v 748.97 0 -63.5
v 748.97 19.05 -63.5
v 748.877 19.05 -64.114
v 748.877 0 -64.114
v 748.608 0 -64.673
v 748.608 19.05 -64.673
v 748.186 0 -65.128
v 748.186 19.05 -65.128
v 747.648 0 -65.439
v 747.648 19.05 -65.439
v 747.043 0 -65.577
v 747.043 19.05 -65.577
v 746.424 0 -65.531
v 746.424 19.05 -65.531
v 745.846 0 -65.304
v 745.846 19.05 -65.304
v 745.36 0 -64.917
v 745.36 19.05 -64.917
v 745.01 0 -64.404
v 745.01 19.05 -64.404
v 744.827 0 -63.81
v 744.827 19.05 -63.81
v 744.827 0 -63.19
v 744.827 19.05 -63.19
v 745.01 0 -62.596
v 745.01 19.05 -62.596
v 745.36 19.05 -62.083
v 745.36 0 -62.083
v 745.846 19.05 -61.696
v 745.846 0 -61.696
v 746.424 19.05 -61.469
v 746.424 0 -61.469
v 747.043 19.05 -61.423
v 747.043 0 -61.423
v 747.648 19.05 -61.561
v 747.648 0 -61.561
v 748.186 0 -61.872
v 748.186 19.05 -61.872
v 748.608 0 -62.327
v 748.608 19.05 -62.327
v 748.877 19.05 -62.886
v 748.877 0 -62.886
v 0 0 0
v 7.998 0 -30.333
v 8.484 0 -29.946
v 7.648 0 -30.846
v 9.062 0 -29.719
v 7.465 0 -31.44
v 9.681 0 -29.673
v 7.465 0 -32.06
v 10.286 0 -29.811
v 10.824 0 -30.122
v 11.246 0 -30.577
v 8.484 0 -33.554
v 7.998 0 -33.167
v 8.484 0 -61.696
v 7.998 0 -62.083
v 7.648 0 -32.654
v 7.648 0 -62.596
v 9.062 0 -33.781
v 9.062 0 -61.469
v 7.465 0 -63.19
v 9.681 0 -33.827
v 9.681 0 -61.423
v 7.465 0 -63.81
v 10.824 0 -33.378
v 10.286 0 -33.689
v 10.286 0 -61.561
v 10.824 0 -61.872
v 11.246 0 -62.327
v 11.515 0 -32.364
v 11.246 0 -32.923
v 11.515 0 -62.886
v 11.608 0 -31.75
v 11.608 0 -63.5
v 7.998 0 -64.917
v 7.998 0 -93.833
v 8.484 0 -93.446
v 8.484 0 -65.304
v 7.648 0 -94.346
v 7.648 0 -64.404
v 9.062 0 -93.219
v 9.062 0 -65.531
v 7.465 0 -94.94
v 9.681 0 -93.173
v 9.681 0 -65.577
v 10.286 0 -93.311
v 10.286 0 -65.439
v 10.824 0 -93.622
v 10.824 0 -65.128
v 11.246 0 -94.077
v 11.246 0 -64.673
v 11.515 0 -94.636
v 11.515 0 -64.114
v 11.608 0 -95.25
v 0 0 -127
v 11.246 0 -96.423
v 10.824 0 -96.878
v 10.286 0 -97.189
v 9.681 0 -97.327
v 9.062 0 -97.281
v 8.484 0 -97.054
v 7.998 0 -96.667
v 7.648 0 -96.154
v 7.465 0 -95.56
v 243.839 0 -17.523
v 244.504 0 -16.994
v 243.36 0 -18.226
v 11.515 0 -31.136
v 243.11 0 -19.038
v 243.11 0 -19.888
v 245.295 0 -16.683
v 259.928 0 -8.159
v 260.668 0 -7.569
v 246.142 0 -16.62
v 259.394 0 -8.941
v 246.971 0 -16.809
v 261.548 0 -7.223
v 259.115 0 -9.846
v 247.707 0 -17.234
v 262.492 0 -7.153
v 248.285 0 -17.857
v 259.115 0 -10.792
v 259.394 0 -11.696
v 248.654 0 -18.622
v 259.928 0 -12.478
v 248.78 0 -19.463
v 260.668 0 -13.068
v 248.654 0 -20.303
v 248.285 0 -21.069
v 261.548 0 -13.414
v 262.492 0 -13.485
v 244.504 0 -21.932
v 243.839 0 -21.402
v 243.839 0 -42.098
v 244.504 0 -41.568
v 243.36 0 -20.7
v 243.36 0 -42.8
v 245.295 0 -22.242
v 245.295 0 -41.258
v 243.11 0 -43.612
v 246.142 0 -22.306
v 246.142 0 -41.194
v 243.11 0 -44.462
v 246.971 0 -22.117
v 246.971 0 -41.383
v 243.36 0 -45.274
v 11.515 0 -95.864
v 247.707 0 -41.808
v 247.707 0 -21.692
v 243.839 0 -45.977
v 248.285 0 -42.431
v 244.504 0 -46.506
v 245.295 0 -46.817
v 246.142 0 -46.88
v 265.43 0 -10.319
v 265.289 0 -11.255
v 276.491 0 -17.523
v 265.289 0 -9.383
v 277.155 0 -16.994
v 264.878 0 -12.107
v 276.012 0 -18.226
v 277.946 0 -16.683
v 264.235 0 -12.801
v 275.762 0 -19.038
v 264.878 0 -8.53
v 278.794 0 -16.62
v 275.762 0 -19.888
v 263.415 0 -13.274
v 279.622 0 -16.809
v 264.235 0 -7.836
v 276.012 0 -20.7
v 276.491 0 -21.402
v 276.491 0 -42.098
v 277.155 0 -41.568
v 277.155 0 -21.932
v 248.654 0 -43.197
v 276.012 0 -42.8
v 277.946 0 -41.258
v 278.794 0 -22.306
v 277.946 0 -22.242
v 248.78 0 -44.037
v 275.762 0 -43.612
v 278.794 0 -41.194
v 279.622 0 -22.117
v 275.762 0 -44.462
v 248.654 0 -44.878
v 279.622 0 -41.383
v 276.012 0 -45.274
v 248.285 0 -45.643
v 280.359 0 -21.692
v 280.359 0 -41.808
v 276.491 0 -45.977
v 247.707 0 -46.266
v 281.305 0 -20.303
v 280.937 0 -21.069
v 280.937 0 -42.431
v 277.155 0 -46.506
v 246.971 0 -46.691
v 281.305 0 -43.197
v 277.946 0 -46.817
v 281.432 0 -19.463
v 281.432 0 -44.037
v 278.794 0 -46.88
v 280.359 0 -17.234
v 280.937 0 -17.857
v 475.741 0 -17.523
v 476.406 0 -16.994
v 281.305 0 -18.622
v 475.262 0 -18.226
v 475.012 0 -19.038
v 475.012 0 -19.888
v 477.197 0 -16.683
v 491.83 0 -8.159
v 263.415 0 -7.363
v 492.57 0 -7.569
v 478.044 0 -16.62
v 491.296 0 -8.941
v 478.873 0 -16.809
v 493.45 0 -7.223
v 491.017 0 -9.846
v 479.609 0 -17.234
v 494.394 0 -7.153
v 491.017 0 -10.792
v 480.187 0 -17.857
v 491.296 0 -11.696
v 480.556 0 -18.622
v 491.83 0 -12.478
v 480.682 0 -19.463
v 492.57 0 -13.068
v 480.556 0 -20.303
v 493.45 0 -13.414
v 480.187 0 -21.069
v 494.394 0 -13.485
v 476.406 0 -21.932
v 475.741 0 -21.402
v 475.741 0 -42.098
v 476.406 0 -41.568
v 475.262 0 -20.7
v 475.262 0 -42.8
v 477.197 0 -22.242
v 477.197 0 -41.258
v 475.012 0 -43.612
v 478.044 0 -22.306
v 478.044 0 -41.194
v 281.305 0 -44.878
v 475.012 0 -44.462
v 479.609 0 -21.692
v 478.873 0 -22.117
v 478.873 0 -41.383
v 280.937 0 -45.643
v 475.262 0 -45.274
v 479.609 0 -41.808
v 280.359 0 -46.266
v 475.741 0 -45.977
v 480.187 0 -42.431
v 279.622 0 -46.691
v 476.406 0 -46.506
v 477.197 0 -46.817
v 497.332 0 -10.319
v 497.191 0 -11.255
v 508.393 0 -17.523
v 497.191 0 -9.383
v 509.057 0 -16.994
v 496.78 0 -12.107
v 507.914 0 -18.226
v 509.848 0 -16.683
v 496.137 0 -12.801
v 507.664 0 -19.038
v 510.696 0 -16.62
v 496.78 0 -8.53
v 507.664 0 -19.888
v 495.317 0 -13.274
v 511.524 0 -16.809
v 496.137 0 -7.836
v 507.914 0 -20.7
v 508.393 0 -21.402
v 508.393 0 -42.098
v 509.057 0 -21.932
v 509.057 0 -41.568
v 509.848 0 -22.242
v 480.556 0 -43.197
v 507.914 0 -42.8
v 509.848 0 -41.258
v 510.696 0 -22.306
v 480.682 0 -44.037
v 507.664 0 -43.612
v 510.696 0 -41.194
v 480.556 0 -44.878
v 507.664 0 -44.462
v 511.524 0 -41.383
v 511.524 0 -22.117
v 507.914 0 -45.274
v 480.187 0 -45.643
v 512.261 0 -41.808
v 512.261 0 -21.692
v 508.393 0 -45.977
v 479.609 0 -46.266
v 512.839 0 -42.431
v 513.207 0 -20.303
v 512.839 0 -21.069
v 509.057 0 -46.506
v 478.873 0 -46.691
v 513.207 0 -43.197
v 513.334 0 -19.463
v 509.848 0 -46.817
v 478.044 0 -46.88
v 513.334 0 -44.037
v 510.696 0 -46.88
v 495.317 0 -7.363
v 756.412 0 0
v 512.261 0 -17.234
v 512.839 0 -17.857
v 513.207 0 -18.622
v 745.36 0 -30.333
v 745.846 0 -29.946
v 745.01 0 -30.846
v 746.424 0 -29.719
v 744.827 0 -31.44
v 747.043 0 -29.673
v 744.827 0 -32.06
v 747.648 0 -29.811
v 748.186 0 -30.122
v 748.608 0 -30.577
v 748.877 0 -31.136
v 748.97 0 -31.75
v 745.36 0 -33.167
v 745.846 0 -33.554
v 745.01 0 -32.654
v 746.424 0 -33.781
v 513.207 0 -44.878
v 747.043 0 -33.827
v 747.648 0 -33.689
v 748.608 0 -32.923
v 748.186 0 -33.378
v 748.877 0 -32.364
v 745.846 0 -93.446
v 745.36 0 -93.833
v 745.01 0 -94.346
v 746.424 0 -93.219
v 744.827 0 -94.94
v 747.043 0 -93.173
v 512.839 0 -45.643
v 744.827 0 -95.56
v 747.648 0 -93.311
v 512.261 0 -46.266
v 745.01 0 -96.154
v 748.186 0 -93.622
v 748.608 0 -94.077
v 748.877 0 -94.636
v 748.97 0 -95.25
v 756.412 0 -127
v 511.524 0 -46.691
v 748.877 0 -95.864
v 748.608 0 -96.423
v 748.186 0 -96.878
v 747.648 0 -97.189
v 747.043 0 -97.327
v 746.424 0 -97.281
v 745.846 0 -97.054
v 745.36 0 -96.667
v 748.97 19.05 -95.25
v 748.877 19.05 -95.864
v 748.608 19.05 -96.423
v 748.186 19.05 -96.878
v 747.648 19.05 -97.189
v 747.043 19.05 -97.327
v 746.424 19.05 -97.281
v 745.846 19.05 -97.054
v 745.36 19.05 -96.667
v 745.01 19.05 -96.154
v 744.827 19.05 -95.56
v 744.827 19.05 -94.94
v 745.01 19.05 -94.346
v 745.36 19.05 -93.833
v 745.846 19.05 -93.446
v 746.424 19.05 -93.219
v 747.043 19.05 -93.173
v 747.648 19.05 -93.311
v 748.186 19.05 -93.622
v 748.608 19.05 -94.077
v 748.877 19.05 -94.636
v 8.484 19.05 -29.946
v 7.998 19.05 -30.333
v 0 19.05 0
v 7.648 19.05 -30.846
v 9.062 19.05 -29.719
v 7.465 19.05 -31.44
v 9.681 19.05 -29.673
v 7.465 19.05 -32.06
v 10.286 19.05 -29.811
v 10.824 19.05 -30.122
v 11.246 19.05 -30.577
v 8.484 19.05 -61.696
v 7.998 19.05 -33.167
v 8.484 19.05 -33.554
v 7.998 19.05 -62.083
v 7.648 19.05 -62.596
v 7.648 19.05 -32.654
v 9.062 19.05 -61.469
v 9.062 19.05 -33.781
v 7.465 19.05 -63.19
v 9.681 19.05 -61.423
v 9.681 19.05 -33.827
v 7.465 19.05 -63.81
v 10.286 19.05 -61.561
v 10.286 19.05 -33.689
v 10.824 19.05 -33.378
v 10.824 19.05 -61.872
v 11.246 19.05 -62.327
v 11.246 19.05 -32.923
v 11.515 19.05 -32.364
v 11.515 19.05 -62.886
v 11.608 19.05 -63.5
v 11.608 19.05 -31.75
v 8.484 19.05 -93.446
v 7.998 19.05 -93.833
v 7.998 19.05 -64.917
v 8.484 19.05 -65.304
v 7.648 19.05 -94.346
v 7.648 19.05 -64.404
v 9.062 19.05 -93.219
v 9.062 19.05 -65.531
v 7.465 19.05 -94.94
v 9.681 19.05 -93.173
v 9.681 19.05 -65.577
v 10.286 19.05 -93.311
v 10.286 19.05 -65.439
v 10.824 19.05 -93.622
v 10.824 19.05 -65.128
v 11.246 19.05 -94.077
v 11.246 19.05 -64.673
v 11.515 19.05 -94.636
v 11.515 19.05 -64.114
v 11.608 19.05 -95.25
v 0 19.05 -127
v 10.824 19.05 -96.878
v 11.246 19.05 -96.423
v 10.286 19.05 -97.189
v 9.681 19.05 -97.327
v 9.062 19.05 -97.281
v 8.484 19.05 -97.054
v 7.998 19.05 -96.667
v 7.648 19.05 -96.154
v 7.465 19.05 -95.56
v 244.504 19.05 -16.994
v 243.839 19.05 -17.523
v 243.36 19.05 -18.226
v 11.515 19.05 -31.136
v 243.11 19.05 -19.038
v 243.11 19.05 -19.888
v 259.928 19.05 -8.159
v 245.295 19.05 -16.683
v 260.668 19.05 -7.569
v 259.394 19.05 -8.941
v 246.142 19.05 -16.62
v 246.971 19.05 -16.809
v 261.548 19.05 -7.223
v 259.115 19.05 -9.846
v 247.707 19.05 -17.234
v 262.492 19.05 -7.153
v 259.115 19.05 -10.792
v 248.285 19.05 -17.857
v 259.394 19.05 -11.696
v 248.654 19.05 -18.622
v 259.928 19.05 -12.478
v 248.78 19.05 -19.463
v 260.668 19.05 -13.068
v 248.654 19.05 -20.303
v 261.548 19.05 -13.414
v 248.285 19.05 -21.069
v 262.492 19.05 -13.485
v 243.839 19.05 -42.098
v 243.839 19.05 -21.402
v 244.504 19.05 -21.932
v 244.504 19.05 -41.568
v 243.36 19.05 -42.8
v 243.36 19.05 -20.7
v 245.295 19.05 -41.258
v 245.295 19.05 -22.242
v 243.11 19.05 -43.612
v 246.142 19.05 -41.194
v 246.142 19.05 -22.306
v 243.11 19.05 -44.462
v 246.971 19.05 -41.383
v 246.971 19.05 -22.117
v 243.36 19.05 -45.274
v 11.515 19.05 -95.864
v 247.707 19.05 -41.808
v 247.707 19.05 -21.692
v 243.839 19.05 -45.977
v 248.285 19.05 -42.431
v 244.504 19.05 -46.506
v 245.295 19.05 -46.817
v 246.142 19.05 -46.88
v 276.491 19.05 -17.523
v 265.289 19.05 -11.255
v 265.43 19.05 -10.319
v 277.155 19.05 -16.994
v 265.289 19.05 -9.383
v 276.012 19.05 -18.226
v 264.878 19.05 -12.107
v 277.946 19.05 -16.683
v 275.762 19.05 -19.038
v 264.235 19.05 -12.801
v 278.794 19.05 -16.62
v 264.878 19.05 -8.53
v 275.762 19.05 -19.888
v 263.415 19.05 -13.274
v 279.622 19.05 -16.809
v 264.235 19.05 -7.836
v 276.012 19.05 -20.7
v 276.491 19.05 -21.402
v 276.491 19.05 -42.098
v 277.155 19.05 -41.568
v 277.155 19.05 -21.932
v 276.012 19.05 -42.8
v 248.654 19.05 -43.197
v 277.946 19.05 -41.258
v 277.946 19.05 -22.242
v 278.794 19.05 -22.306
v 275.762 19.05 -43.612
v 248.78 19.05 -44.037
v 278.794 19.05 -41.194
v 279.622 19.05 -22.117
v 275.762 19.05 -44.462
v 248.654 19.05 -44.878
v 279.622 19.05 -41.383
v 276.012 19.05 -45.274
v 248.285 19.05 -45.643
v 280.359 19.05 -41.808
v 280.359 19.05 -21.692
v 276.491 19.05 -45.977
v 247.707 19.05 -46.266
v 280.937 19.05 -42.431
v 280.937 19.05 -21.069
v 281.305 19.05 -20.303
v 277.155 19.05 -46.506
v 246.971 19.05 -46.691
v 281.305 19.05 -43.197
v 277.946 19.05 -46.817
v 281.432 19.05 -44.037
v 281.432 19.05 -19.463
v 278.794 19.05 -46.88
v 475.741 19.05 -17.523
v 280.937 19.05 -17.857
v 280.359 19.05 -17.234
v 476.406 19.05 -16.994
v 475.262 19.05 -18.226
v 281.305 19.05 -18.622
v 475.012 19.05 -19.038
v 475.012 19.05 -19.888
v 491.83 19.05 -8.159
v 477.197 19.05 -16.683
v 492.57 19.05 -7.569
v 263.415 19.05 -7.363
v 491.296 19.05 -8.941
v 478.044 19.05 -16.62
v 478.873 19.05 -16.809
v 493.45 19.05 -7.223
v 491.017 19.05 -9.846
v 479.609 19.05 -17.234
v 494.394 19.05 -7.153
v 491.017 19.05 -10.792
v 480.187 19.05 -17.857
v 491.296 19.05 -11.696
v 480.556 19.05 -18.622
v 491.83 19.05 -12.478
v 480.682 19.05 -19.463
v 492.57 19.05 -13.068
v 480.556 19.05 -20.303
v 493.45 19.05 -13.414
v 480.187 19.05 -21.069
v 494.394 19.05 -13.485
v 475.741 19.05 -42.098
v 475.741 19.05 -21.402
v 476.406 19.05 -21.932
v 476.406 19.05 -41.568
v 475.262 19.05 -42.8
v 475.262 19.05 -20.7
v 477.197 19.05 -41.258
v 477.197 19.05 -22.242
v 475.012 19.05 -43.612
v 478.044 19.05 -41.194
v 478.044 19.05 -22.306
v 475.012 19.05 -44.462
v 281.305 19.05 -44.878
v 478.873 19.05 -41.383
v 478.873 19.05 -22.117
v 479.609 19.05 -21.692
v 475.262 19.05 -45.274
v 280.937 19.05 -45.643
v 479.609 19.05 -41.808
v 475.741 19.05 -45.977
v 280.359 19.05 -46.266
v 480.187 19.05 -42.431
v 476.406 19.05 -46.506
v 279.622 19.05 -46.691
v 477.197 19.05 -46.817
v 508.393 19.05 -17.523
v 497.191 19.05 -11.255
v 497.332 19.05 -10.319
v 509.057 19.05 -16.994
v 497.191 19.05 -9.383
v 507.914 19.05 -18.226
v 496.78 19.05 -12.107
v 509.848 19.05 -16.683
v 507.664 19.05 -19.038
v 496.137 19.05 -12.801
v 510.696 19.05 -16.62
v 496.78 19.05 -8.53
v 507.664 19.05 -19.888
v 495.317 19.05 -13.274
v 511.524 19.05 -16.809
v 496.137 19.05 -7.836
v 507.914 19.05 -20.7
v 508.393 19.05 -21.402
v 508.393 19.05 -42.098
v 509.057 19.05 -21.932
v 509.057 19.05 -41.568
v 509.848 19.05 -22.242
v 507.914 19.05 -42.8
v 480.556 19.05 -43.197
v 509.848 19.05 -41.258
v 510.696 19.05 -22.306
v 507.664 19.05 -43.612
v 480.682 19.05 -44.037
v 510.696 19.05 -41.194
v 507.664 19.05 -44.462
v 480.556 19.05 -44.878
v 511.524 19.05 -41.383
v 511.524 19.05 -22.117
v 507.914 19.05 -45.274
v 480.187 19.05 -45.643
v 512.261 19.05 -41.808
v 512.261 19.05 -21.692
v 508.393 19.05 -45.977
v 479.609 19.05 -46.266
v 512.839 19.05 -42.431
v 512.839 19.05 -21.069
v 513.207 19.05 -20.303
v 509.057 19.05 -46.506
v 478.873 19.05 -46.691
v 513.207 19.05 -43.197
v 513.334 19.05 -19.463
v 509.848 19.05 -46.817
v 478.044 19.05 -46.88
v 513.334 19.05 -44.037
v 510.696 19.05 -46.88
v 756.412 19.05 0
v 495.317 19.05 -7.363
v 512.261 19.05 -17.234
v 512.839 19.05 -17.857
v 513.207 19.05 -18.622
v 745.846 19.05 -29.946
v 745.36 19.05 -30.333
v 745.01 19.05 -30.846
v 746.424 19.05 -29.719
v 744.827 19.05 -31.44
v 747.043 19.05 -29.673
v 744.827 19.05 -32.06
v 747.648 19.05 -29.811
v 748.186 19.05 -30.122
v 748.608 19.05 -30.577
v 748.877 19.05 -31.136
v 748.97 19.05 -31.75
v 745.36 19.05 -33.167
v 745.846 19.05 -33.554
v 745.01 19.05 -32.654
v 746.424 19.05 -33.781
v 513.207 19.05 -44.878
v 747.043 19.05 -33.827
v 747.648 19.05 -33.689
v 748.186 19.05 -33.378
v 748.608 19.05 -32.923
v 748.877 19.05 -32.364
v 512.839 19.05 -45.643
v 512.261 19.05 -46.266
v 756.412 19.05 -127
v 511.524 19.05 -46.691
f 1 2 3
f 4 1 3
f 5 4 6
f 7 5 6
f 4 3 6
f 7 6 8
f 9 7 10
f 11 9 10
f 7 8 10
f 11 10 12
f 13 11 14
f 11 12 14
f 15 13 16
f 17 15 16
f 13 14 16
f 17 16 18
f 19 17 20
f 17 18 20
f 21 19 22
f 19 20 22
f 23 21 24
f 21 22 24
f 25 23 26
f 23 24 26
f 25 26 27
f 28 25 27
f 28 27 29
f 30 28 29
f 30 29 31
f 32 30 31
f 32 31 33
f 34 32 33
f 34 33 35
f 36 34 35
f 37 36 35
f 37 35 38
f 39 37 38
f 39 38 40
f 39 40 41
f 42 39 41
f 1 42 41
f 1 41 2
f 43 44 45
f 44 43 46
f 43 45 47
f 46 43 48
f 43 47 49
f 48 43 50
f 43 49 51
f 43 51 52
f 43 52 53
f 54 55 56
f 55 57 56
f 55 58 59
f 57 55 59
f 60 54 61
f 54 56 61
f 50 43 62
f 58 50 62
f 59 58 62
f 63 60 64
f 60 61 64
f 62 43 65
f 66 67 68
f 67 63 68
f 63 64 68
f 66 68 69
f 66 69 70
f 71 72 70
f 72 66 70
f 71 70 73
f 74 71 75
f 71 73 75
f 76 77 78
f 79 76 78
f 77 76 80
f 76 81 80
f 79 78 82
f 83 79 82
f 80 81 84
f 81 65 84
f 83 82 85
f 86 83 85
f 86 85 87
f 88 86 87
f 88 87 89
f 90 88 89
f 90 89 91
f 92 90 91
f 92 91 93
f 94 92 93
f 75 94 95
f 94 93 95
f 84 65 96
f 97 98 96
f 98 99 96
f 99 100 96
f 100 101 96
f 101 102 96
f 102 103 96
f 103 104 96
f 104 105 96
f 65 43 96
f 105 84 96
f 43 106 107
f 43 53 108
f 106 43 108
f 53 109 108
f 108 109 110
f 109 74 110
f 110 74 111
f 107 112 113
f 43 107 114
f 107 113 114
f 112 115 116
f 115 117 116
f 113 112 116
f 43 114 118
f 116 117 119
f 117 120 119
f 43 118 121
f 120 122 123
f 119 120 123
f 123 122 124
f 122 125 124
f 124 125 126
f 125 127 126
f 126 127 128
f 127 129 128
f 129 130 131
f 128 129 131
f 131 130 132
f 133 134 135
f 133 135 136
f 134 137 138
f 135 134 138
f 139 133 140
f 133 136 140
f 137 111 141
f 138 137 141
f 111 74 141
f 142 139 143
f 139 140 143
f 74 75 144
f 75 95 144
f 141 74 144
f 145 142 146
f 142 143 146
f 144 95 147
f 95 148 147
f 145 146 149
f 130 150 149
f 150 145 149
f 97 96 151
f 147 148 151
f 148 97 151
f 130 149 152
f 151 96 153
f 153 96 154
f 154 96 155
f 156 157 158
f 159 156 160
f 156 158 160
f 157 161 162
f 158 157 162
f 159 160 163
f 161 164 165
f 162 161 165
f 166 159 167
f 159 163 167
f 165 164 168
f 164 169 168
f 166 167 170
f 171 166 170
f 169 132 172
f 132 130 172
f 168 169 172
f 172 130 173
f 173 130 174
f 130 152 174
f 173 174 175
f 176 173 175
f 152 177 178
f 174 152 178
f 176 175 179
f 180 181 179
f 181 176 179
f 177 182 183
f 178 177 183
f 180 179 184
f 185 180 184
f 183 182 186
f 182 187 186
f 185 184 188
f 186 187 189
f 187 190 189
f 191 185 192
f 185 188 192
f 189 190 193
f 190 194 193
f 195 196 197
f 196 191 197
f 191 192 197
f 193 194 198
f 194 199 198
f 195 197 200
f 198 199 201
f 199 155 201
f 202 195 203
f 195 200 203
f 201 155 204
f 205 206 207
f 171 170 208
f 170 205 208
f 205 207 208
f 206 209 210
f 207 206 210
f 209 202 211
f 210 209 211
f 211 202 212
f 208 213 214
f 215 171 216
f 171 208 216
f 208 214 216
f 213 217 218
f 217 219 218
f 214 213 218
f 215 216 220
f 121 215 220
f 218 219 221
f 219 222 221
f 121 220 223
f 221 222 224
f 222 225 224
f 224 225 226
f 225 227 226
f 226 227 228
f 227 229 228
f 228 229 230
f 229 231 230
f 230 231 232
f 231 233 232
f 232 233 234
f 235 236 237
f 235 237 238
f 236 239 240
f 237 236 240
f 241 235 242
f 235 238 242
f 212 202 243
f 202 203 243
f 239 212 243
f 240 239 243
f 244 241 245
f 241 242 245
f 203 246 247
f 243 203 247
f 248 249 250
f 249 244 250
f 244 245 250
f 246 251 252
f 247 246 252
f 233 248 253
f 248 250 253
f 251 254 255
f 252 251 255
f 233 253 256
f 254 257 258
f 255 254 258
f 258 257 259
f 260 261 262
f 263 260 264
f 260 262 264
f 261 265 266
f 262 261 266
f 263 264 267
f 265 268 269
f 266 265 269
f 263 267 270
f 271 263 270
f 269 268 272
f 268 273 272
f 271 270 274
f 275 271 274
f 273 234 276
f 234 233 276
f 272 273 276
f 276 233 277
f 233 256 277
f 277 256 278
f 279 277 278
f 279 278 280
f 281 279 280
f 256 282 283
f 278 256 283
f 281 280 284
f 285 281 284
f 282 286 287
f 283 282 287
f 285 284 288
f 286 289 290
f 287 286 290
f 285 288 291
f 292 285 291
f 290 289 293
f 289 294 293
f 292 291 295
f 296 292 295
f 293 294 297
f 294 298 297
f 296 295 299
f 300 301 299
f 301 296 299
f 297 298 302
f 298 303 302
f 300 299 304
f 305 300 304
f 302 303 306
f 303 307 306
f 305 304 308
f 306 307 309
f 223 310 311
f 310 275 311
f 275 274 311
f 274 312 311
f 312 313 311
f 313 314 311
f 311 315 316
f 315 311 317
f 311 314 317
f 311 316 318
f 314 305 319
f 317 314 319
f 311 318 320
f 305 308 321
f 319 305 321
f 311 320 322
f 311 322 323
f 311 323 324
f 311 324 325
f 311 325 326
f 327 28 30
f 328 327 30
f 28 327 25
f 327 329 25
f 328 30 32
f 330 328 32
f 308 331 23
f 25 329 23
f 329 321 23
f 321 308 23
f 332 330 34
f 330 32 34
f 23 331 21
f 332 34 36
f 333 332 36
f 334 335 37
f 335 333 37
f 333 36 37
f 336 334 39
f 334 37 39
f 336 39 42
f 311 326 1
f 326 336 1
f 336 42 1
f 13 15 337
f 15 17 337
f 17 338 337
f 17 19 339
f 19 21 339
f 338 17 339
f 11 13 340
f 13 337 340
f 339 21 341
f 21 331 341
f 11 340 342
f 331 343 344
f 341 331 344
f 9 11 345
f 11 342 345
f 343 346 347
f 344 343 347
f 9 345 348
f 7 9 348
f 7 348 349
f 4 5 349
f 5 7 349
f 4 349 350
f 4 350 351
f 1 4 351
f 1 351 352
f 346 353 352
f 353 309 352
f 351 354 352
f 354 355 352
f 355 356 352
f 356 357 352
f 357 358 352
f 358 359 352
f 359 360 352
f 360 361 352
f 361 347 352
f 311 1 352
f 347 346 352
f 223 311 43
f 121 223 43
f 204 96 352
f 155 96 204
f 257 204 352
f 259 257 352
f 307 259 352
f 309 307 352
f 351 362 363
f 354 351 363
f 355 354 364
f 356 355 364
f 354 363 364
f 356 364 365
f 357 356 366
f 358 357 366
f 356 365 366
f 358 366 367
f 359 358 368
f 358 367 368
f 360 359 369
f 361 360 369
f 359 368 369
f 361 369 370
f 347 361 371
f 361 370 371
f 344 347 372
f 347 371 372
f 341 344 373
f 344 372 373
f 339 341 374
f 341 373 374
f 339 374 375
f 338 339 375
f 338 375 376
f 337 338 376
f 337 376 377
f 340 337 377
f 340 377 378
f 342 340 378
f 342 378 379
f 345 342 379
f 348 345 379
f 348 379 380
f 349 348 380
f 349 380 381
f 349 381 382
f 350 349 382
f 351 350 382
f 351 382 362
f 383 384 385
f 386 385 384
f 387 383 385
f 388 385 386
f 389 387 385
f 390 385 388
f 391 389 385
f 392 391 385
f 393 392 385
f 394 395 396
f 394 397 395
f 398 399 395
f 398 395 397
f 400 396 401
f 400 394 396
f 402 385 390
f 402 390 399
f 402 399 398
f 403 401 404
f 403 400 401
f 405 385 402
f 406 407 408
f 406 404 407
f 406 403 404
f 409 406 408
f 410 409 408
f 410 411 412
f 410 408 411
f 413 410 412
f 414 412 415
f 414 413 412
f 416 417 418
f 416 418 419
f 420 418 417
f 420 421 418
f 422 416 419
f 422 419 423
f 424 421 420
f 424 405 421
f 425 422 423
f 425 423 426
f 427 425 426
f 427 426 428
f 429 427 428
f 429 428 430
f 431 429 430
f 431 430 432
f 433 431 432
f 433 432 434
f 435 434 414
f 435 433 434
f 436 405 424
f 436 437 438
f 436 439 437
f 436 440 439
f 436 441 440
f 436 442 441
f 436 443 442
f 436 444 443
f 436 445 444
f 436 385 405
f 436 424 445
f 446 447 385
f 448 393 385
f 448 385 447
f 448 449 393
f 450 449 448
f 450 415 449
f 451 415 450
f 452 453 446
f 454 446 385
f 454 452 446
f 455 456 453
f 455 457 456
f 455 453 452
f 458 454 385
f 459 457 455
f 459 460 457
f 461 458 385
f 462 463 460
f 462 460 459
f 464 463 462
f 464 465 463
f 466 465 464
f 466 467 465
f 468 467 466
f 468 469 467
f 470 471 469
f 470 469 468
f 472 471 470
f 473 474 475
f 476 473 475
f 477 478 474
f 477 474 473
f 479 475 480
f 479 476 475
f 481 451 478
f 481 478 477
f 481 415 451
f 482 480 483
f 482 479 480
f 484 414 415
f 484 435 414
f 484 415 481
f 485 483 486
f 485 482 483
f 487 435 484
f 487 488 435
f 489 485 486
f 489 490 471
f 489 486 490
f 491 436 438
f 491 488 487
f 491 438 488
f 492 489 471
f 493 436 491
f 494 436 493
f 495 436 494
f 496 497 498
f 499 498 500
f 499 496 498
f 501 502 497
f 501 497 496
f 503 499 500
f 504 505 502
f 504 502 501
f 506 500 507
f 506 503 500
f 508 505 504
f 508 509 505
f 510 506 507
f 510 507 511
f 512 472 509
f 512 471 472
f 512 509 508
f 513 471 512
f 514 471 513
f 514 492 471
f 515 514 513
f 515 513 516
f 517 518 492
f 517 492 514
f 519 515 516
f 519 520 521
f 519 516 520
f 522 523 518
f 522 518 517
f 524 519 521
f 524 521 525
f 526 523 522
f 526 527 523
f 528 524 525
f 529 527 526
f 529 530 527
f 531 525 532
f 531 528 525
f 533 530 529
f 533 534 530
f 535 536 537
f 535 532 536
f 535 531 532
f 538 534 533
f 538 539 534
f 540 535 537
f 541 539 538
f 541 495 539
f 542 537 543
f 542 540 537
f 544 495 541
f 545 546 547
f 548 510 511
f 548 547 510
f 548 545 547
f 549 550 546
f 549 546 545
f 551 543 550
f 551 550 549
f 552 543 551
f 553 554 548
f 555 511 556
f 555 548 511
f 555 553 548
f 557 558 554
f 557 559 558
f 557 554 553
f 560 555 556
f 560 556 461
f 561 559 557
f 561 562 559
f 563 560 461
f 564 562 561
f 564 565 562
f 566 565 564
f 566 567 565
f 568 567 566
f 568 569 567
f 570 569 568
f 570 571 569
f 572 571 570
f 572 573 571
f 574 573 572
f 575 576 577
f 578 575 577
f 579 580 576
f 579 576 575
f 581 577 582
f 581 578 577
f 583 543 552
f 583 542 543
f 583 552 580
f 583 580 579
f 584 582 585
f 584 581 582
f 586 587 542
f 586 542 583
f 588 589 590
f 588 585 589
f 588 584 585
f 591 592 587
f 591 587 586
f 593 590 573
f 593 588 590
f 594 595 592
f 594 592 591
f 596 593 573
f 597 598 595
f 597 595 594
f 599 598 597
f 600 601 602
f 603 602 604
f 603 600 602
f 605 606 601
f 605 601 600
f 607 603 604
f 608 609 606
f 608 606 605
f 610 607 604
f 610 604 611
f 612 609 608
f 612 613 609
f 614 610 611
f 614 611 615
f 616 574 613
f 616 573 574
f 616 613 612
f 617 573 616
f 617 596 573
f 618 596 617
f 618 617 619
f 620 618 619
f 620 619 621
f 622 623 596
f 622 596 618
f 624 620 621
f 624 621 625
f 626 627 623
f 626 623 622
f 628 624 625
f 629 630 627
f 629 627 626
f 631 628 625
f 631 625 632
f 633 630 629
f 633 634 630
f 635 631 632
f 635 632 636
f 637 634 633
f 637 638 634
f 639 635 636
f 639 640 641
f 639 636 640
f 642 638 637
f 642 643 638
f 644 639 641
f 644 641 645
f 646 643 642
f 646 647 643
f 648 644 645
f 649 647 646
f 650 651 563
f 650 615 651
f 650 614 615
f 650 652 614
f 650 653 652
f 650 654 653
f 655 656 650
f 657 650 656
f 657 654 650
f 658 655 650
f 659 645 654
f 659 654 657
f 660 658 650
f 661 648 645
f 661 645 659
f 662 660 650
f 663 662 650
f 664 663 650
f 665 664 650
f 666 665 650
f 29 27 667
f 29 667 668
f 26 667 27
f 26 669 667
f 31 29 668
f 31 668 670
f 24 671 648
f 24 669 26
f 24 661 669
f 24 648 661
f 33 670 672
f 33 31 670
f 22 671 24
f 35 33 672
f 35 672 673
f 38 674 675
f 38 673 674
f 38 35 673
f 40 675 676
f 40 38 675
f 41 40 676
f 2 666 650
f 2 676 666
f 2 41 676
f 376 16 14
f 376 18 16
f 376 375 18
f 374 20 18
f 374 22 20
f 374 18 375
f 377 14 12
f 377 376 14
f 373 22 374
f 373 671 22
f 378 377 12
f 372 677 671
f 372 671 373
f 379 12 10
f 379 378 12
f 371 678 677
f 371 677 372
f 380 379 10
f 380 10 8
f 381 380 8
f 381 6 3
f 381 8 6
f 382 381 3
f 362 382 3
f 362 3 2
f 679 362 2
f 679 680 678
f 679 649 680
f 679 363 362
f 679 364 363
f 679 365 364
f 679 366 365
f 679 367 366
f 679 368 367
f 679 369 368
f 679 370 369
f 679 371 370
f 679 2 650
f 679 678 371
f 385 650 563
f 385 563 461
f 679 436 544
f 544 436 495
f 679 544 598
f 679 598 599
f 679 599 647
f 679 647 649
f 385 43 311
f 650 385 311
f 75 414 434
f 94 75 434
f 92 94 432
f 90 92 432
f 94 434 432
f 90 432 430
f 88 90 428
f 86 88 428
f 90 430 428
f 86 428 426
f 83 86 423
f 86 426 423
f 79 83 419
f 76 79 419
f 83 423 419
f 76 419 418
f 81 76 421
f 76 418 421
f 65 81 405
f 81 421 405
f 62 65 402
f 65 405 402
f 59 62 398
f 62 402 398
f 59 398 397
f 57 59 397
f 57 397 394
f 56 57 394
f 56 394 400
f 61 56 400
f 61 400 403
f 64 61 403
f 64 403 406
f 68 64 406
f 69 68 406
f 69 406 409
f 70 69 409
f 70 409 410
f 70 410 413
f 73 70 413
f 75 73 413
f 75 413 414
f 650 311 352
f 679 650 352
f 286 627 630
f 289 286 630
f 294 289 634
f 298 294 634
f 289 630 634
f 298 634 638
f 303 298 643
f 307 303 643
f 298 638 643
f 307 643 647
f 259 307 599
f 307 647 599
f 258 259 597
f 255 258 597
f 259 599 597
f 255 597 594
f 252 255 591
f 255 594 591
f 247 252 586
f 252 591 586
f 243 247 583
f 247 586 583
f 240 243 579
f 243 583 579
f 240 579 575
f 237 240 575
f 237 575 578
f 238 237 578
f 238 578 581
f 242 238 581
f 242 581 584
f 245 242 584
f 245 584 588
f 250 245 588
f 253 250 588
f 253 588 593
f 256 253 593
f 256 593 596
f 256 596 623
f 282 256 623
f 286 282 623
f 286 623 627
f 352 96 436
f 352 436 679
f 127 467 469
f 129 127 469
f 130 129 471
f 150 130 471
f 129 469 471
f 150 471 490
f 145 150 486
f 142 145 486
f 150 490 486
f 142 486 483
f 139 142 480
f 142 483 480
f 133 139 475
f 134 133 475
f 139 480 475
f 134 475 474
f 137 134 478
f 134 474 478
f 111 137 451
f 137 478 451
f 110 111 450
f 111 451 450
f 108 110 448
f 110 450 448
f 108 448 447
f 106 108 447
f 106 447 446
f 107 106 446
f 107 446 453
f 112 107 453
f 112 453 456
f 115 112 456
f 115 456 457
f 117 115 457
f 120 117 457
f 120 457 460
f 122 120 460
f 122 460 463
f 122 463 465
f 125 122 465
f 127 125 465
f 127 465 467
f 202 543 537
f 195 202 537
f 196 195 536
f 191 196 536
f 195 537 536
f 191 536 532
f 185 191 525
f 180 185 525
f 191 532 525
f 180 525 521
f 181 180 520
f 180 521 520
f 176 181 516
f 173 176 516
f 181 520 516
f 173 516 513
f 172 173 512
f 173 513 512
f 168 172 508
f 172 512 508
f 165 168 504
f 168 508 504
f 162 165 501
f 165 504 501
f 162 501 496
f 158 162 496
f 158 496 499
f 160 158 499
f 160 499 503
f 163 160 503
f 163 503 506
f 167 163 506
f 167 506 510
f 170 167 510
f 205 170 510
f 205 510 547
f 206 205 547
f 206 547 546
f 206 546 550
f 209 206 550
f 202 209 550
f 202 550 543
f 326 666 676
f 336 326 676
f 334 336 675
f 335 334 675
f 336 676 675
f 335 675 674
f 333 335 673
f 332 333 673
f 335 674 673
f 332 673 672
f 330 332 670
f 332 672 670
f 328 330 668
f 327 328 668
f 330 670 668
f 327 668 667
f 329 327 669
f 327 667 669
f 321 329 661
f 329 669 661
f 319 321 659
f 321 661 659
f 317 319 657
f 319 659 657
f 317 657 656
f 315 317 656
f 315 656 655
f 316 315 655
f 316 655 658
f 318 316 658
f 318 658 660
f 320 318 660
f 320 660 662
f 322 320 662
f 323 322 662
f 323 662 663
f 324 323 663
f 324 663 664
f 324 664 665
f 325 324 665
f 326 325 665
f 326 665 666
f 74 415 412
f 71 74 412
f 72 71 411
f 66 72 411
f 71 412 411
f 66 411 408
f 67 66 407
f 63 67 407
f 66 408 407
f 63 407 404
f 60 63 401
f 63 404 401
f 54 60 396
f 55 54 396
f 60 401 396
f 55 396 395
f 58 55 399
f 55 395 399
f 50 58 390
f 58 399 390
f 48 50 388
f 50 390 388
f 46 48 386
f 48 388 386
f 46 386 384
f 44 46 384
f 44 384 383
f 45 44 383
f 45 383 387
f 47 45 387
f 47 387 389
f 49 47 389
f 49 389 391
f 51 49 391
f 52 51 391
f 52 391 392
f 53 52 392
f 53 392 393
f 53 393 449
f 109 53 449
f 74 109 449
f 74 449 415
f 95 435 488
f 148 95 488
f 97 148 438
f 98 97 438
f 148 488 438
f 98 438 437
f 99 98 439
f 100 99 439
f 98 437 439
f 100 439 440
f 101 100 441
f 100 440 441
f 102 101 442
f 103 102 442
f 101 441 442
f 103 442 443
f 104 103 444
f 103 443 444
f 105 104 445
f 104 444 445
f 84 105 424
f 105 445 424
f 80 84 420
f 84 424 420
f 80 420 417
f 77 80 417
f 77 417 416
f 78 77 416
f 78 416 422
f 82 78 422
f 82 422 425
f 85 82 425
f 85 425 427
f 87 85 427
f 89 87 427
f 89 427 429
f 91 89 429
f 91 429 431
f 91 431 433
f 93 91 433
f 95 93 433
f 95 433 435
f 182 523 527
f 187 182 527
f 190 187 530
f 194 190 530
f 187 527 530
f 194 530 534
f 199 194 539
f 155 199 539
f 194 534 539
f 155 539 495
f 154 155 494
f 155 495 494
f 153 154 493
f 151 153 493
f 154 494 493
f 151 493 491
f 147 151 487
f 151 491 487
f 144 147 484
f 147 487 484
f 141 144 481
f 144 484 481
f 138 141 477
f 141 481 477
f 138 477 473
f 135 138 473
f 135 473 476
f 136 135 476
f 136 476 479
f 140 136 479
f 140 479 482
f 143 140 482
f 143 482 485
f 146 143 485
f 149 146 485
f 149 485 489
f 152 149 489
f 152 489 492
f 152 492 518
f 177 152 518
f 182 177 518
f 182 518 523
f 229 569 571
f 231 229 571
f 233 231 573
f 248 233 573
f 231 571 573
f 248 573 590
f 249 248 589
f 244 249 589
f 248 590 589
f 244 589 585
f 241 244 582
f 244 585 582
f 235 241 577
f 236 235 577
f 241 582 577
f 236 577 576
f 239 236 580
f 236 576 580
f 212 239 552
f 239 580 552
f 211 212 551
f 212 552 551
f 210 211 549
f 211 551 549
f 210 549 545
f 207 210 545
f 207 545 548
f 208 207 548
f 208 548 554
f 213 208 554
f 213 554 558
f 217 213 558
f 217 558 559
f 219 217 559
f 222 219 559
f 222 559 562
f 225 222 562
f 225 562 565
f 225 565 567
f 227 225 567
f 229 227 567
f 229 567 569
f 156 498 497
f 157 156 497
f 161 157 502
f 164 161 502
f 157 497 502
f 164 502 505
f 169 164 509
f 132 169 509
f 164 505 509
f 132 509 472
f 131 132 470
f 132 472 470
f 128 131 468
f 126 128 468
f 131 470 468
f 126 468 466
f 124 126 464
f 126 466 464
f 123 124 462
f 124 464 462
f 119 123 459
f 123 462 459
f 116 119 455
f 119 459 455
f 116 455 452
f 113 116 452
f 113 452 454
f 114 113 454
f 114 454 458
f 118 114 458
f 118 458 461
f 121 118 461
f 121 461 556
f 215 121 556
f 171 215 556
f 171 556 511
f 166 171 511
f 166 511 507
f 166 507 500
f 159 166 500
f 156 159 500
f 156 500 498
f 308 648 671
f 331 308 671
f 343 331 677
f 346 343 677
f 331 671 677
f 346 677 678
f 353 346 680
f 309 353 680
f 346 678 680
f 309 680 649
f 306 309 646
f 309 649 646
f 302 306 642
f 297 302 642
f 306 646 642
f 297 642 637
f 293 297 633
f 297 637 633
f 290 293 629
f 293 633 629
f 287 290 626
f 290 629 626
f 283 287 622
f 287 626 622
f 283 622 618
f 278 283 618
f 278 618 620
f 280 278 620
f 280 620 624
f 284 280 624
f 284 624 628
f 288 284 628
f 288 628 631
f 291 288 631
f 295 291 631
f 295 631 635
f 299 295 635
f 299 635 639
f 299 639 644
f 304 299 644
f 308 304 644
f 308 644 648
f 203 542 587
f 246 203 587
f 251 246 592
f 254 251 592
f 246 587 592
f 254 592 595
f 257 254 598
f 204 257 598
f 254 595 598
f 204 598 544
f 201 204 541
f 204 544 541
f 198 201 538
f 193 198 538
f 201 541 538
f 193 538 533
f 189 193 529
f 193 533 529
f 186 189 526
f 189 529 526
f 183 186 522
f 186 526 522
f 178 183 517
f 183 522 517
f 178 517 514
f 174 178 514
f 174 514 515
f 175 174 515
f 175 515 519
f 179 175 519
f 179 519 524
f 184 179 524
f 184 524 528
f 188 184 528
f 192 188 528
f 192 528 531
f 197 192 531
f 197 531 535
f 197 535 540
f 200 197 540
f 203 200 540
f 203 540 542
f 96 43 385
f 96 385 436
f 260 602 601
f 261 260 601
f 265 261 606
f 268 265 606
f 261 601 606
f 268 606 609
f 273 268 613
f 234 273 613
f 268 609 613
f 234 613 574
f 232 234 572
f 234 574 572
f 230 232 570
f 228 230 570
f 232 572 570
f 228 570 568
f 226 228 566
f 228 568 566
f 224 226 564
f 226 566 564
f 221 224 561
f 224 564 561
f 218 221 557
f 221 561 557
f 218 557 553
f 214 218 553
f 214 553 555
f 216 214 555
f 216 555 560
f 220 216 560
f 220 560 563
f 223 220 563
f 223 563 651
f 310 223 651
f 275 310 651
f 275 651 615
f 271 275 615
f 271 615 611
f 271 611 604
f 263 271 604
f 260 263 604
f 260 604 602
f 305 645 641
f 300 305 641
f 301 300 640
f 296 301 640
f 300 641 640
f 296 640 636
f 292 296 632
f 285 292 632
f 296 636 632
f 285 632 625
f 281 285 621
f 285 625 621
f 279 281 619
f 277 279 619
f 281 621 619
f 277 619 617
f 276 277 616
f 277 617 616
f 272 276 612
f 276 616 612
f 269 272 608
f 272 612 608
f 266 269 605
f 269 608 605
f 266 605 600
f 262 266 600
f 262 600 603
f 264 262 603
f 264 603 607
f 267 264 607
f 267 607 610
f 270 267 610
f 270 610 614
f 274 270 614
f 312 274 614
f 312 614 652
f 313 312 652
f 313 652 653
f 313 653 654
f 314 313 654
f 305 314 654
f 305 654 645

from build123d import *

# Parameters (mm, degrees)
SKETCH2_W           = 756.412
SKETCH2_H           = 127
BOSS_EXTRUDE1_DEPTH = 19.05
CUT_EXTRUDE1_REACH  = 21.05
SKETCH3_R           = 2.85115
CUT_EXTRUDE2_REACH  = 21.05
SKETCH4_R           = 3.175
CUT_EXTRUDE3_REACH  = 21.05
SKETCH5_R           = 2.0828


with BuildPart() as part:
    # Sketch2 → Boss-Extrude1 (new body)
    with BuildSketch(Plane(origin=(0, 0, 0), x_dir=(1, 0, 0), z_dir=(0, 1, 0))):
        with Locations((378.206, 63.5)):
            Rectangle(SKETCH2_W, SKETCH2_H)
    extrude(amount=BOSS_EXTRUDE1_DEPTH)

    # Sketch3 → Cut-Extrude1 (cut, up to next)
    with BuildSketch(Plane(origin=(0, 19.05, 0), x_dir=(1, 0, 0), z_dir=(0, 1, 0)), mode=Mode.PRIVATE) as cut_extrude1_sk1:
        with Locations((245.92915, 19.46275)):
            Circle(SKETCH3_R)
    cut_extrude1_tool1 = extrude(cut_extrude1_sk1.sketch, amount=-CUT_EXTRUDE1_REACH, mode=Mode.PRIVATE) & part.part
    add(cut_extrude1_tool1.solids().sort_by_distance((245.92915, 19.05, -19.46275))[0], mode=Mode.SUBTRACT)
    # Sketch3 → Cut-Extrude1 (cut, up to next)
    with BuildSketch(Plane(origin=(0, 19.05, 0), x_dir=(1, 0, 0), z_dir=(0, 1, 0)), mode=Mode.PRIVATE) as cut_extrude1_sk2:
        with Locations((278.58085, 19.46275)):
            Circle(SKETCH3_R)
    cut_extrude1_tool2 = extrude(cut_extrude1_sk2.sketch, amount=-CUT_EXTRUDE1_REACH, mode=Mode.PRIVATE) & part.part
    add(cut_extrude1_tool2.solids().sort_by_distance((278.58085, 19.05, -19.46275))[0], mode=Mode.SUBTRACT)
    # Sketch3 → Cut-Extrude1 (cut, up to next)
    with BuildSketch(Plane(origin=(0, 19.05, 0), x_dir=(1, 0, 0), z_dir=(0, 1, 0)), mode=Mode.PRIVATE) as cut_extrude1_sk3:
        with Locations((278.58085, 44.03725)):
            Circle(SKETCH3_R)
    cut_extrude1_tool3 = extrude(cut_extrude1_sk3.sketch, amount=-CUT_EXTRUDE1_REACH, mode=Mode.PRIVATE) & part.part
    add(cut_extrude1_tool3.solids().sort_by_distance((278.58085, 19.05, -44.03725))[0], mode=Mode.SUBTRACT)
    # Sketch3 → Cut-Extrude1 (cut, up to next)
    with BuildSketch(Plane(origin=(0, 19.05, 0), x_dir=(1, 0, 0), z_dir=(0, 1, 0)), mode=Mode.PRIVATE) as cut_extrude1_sk4:
        with Locations((245.92915, 44.03725)):
            Circle(SKETCH3_R)
    cut_extrude1_tool4 = extrude(cut_extrude1_sk4.sketch, amount=-CUT_EXTRUDE1_REACH, mode=Mode.PRIVATE) & part.part
    add(cut_extrude1_tool4.solids().sort_by_distance((245.92915, 19.05, -44.03725))[0], mode=Mode.SUBTRACT)
    # Sketch3 → Cut-Extrude1 (cut, up to next)
    with BuildSketch(Plane(origin=(0, 19.05, 0), x_dir=(1, 0, 0), z_dir=(0, 1, 0)), mode=Mode.PRIVATE) as cut_extrude1_sk5:
        with Locations((477.83115, 19.46275)):
            Circle(SKETCH3_R)
    cut_extrude1_tool5 = extrude(cut_extrude1_sk5.sketch, amount=-CUT_EXTRUDE1_REACH, mode=Mode.PRIVATE) & part.part
    add(cut_extrude1_tool5.solids().sort_by_distance((477.83115, 19.05, -19.46275))[0], mode=Mode.SUBTRACT)
    # Sketch3 → Cut-Extrude1 (cut, up to next)
    with BuildSketch(Plane(origin=(0, 19.05, 0), x_dir=(1, 0, 0), z_dir=(0, 1, 0)), mode=Mode.PRIVATE) as cut_extrude1_sk6:
        with Locations((510.48285, 19.46275)):
            Circle(SKETCH3_R)
    cut_extrude1_tool6 = extrude(cut_extrude1_sk6.sketch, amount=-CUT_EXTRUDE1_REACH, mode=Mode.PRIVATE) & part.part
    add(cut_extrude1_tool6.solids().sort_by_distance((510.48285, 19.05, -19.46275))[0], mode=Mode.SUBTRACT)
    # Sketch3 → Cut-Extrude1 (cut, up to next)
    with BuildSketch(Plane(origin=(0, 19.05, 0), x_dir=(1, 0, 0), z_dir=(0, 1, 0)), mode=Mode.PRIVATE) as cut_extrude1_sk7:
        with Locations((510.48285, 44.03725)):
            Circle(SKETCH3_R)
    cut_extrude1_tool7 = extrude(cut_extrude1_sk7.sketch, amount=-CUT_EXTRUDE1_REACH, mode=Mode.PRIVATE) & part.part
    add(cut_extrude1_tool7.solids().sort_by_distance((510.48285, 19.05, -44.03725))[0], mode=Mode.SUBTRACT)
    # Sketch3 → Cut-Extrude1 (cut, up to next)
    with BuildSketch(Plane(origin=(0, 19.05, 0), x_dir=(1, 0, 0), z_dir=(0, 1, 0)), mode=Mode.PRIVATE) as cut_extrude1_sk8:
        with Locations((477.83115, 44.03725)):
            Circle(SKETCH3_R)
    cut_extrude1_tool8 = extrude(cut_extrude1_sk8.sketch, amount=-CUT_EXTRUDE1_REACH, mode=Mode.PRIVATE) & part.part
    add(cut_extrude1_tool8.solids().sort_by_distance((477.83115, 19.05, -44.03725))[0], mode=Mode.SUBTRACT)

    # Sketch4 → Cut-Extrude2 (cut, up to next)
    with BuildSketch(Plane(origin=(0, 19.05, 0), x_dir=(1, 0, 0), z_dir=(0, 1, 0)), mode=Mode.PRIVATE) as cut_extrude2_sk1:
        with Locations((494.157, 10.31875)):
            Circle(SKETCH4_R)
    cut_extrude2_tool1 = extrude(cut_extrude2_sk1.sketch, amount=-CUT_EXTRUDE2_REACH, mode=Mode.PRIVATE) & part.part
    add(cut_extrude2_tool1.solids().sort_by_distance((494.157, 19.05, -10.31875))[0], mode=Mode.SUBTRACT)
    # Sketch4 → Cut-Extrude2 (cut, up to next)
    with BuildSketch(Plane(origin=(0, 19.05, 0), x_dir=(1, 0, 0), z_dir=(0, 1, 0)), mode=Mode.PRIVATE) as cut_extrude2_sk2:
        with Locations((262.255, 10.31875)):
            Circle(SKETCH4_R)
    cut_extrude2_tool2 = extrude(cut_extrude2_sk2.sketch, amount=-CUT_EXTRUDE2_REACH, mode=Mode.PRIVATE) & part.part
    add(cut_extrude2_tool2.solids().sort_by_distance((262.255, 19.05, -10.31875))[0], mode=Mode.SUBTRACT)

    # Sketch5 → Cut-Extrude3 (cut, up to next)
    with BuildSketch(Plane(origin=(0, 19.05, 0), x_dir=(1, 0, 0), z_dir=(0, 1, 0)), mode=Mode.PRIVATE) as cut_extrude3_sk1:
        with Locations((9.525, 95.25)):
            Circle(SKETCH5_R)
    cut_extrude3_tool1 = extrude(cut_extrude3_sk1.sketch, amount=-CUT_EXTRUDE3_REACH, mode=Mode.PRIVATE) & part.part
    add(cut_extrude3_tool1.solids().sort_by_distance((9.525, 19.05, -95.25))[0], mode=Mode.SUBTRACT)
    # Sketch5 → Cut-Extrude3 (cut, up to next)
    with BuildSketch(Plane(origin=(0, 19.05, 0), x_dir=(1, 0, 0), z_dir=(0, 1, 0)), mode=Mode.PRIVATE) as cut_extrude3_sk2:
        with Locations((9.525, 63.5)):
            Circle(SKETCH5_R)
    cut_extrude3_tool2 = extrude(cut_extrude3_sk2.sketch, amount=-CUT_EXTRUDE3_REACH, mode=Mode.PRIVATE) & part.part
    add(cut_extrude3_tool2.solids().sort_by_distance((9.525, 19.05, -63.5))[0], mode=Mode.SUBTRACT)
    # Sketch5 → Cut-Extrude3 (cut, up to next)
    with BuildSketch(Plane(origin=(0, 19.05, 0), x_dir=(1, 0, 0), z_dir=(0, 1, 0)), mode=Mode.PRIVATE) as cut_extrude3_sk3:
        with Locations((9.525, 31.75)):
            Circle(SKETCH5_R)
    cut_extrude3_tool3 = extrude(cut_extrude3_sk3.sketch, amount=-CUT_EXTRUDE3_REACH, mode=Mode.PRIVATE) & part.part
    add(cut_extrude3_tool3.solids().sort_by_distance((9.525, 19.05, -31.75))[0], mode=Mode.SUBTRACT)
    # Sketch5 → Cut-Extrude3 (cut, up to next)
    with BuildSketch(Plane(origin=(0, 19.05, 0), x_dir=(1, 0, 0), z_dir=(0, 1, 0)), mode=Mode.PRIVATE) as cut_extrude3_sk4:
        with Locations((746.887, 31.75)):
            Circle(SKETCH5_R)
    cut_extrude3_tool4 = extrude(cut_extrude3_sk4.sketch, amount=-CUT_EXTRUDE3_REACH, mode=Mode.PRIVATE) & part.part
    add(cut_extrude3_tool4.solids().sort_by_distance((746.887, 19.05, -31.75))[0], mode=Mode.SUBTRACT)
    # Sketch5 → Cut-Extrude3 (cut, up to next)
    with BuildSketch(Plane(origin=(0, 19.05, 0), x_dir=(1, 0, 0), z_dir=(0, 1, 0)), mode=Mode.PRIVATE) as cut_extrude3_sk5:
        with Locations((746.887, 63.5)):
            Circle(SKETCH5_R)
    cut_extrude3_tool5 = extrude(cut_extrude3_sk5.sketch, amount=-CUT_EXTRUDE3_REACH, mode=Mode.PRIVATE) & part.part
    add(cut_extrude3_tool5.solids().sort_by_distance((746.887, 19.05, -63.5))[0], mode=Mode.SUBTRACT)
    # Sketch5 → Cut-Extrude3 (cut, up to next)
    with BuildSketch(Plane(origin=(0, 19.05, 0), x_dir=(1, 0, 0), z_dir=(0, 1, 0)), mode=Mode.PRIVATE) as cut_extrude3_sk6:
        with Locations((746.887, 95.25)):
            Circle(SKETCH5_R)
    cut_extrude3_tool6 = extrude(cut_extrude3_sk6.sketch, amount=-CUT_EXTRUDE3_REACH, mode=Mode.PRIVATE) & part.part
    add(cut_extrude3_tool6.solids().sort_by_distance((746.887, 19.05, -95.25))[0], mode=Mode.SUBTRACT)


solid = part.part
